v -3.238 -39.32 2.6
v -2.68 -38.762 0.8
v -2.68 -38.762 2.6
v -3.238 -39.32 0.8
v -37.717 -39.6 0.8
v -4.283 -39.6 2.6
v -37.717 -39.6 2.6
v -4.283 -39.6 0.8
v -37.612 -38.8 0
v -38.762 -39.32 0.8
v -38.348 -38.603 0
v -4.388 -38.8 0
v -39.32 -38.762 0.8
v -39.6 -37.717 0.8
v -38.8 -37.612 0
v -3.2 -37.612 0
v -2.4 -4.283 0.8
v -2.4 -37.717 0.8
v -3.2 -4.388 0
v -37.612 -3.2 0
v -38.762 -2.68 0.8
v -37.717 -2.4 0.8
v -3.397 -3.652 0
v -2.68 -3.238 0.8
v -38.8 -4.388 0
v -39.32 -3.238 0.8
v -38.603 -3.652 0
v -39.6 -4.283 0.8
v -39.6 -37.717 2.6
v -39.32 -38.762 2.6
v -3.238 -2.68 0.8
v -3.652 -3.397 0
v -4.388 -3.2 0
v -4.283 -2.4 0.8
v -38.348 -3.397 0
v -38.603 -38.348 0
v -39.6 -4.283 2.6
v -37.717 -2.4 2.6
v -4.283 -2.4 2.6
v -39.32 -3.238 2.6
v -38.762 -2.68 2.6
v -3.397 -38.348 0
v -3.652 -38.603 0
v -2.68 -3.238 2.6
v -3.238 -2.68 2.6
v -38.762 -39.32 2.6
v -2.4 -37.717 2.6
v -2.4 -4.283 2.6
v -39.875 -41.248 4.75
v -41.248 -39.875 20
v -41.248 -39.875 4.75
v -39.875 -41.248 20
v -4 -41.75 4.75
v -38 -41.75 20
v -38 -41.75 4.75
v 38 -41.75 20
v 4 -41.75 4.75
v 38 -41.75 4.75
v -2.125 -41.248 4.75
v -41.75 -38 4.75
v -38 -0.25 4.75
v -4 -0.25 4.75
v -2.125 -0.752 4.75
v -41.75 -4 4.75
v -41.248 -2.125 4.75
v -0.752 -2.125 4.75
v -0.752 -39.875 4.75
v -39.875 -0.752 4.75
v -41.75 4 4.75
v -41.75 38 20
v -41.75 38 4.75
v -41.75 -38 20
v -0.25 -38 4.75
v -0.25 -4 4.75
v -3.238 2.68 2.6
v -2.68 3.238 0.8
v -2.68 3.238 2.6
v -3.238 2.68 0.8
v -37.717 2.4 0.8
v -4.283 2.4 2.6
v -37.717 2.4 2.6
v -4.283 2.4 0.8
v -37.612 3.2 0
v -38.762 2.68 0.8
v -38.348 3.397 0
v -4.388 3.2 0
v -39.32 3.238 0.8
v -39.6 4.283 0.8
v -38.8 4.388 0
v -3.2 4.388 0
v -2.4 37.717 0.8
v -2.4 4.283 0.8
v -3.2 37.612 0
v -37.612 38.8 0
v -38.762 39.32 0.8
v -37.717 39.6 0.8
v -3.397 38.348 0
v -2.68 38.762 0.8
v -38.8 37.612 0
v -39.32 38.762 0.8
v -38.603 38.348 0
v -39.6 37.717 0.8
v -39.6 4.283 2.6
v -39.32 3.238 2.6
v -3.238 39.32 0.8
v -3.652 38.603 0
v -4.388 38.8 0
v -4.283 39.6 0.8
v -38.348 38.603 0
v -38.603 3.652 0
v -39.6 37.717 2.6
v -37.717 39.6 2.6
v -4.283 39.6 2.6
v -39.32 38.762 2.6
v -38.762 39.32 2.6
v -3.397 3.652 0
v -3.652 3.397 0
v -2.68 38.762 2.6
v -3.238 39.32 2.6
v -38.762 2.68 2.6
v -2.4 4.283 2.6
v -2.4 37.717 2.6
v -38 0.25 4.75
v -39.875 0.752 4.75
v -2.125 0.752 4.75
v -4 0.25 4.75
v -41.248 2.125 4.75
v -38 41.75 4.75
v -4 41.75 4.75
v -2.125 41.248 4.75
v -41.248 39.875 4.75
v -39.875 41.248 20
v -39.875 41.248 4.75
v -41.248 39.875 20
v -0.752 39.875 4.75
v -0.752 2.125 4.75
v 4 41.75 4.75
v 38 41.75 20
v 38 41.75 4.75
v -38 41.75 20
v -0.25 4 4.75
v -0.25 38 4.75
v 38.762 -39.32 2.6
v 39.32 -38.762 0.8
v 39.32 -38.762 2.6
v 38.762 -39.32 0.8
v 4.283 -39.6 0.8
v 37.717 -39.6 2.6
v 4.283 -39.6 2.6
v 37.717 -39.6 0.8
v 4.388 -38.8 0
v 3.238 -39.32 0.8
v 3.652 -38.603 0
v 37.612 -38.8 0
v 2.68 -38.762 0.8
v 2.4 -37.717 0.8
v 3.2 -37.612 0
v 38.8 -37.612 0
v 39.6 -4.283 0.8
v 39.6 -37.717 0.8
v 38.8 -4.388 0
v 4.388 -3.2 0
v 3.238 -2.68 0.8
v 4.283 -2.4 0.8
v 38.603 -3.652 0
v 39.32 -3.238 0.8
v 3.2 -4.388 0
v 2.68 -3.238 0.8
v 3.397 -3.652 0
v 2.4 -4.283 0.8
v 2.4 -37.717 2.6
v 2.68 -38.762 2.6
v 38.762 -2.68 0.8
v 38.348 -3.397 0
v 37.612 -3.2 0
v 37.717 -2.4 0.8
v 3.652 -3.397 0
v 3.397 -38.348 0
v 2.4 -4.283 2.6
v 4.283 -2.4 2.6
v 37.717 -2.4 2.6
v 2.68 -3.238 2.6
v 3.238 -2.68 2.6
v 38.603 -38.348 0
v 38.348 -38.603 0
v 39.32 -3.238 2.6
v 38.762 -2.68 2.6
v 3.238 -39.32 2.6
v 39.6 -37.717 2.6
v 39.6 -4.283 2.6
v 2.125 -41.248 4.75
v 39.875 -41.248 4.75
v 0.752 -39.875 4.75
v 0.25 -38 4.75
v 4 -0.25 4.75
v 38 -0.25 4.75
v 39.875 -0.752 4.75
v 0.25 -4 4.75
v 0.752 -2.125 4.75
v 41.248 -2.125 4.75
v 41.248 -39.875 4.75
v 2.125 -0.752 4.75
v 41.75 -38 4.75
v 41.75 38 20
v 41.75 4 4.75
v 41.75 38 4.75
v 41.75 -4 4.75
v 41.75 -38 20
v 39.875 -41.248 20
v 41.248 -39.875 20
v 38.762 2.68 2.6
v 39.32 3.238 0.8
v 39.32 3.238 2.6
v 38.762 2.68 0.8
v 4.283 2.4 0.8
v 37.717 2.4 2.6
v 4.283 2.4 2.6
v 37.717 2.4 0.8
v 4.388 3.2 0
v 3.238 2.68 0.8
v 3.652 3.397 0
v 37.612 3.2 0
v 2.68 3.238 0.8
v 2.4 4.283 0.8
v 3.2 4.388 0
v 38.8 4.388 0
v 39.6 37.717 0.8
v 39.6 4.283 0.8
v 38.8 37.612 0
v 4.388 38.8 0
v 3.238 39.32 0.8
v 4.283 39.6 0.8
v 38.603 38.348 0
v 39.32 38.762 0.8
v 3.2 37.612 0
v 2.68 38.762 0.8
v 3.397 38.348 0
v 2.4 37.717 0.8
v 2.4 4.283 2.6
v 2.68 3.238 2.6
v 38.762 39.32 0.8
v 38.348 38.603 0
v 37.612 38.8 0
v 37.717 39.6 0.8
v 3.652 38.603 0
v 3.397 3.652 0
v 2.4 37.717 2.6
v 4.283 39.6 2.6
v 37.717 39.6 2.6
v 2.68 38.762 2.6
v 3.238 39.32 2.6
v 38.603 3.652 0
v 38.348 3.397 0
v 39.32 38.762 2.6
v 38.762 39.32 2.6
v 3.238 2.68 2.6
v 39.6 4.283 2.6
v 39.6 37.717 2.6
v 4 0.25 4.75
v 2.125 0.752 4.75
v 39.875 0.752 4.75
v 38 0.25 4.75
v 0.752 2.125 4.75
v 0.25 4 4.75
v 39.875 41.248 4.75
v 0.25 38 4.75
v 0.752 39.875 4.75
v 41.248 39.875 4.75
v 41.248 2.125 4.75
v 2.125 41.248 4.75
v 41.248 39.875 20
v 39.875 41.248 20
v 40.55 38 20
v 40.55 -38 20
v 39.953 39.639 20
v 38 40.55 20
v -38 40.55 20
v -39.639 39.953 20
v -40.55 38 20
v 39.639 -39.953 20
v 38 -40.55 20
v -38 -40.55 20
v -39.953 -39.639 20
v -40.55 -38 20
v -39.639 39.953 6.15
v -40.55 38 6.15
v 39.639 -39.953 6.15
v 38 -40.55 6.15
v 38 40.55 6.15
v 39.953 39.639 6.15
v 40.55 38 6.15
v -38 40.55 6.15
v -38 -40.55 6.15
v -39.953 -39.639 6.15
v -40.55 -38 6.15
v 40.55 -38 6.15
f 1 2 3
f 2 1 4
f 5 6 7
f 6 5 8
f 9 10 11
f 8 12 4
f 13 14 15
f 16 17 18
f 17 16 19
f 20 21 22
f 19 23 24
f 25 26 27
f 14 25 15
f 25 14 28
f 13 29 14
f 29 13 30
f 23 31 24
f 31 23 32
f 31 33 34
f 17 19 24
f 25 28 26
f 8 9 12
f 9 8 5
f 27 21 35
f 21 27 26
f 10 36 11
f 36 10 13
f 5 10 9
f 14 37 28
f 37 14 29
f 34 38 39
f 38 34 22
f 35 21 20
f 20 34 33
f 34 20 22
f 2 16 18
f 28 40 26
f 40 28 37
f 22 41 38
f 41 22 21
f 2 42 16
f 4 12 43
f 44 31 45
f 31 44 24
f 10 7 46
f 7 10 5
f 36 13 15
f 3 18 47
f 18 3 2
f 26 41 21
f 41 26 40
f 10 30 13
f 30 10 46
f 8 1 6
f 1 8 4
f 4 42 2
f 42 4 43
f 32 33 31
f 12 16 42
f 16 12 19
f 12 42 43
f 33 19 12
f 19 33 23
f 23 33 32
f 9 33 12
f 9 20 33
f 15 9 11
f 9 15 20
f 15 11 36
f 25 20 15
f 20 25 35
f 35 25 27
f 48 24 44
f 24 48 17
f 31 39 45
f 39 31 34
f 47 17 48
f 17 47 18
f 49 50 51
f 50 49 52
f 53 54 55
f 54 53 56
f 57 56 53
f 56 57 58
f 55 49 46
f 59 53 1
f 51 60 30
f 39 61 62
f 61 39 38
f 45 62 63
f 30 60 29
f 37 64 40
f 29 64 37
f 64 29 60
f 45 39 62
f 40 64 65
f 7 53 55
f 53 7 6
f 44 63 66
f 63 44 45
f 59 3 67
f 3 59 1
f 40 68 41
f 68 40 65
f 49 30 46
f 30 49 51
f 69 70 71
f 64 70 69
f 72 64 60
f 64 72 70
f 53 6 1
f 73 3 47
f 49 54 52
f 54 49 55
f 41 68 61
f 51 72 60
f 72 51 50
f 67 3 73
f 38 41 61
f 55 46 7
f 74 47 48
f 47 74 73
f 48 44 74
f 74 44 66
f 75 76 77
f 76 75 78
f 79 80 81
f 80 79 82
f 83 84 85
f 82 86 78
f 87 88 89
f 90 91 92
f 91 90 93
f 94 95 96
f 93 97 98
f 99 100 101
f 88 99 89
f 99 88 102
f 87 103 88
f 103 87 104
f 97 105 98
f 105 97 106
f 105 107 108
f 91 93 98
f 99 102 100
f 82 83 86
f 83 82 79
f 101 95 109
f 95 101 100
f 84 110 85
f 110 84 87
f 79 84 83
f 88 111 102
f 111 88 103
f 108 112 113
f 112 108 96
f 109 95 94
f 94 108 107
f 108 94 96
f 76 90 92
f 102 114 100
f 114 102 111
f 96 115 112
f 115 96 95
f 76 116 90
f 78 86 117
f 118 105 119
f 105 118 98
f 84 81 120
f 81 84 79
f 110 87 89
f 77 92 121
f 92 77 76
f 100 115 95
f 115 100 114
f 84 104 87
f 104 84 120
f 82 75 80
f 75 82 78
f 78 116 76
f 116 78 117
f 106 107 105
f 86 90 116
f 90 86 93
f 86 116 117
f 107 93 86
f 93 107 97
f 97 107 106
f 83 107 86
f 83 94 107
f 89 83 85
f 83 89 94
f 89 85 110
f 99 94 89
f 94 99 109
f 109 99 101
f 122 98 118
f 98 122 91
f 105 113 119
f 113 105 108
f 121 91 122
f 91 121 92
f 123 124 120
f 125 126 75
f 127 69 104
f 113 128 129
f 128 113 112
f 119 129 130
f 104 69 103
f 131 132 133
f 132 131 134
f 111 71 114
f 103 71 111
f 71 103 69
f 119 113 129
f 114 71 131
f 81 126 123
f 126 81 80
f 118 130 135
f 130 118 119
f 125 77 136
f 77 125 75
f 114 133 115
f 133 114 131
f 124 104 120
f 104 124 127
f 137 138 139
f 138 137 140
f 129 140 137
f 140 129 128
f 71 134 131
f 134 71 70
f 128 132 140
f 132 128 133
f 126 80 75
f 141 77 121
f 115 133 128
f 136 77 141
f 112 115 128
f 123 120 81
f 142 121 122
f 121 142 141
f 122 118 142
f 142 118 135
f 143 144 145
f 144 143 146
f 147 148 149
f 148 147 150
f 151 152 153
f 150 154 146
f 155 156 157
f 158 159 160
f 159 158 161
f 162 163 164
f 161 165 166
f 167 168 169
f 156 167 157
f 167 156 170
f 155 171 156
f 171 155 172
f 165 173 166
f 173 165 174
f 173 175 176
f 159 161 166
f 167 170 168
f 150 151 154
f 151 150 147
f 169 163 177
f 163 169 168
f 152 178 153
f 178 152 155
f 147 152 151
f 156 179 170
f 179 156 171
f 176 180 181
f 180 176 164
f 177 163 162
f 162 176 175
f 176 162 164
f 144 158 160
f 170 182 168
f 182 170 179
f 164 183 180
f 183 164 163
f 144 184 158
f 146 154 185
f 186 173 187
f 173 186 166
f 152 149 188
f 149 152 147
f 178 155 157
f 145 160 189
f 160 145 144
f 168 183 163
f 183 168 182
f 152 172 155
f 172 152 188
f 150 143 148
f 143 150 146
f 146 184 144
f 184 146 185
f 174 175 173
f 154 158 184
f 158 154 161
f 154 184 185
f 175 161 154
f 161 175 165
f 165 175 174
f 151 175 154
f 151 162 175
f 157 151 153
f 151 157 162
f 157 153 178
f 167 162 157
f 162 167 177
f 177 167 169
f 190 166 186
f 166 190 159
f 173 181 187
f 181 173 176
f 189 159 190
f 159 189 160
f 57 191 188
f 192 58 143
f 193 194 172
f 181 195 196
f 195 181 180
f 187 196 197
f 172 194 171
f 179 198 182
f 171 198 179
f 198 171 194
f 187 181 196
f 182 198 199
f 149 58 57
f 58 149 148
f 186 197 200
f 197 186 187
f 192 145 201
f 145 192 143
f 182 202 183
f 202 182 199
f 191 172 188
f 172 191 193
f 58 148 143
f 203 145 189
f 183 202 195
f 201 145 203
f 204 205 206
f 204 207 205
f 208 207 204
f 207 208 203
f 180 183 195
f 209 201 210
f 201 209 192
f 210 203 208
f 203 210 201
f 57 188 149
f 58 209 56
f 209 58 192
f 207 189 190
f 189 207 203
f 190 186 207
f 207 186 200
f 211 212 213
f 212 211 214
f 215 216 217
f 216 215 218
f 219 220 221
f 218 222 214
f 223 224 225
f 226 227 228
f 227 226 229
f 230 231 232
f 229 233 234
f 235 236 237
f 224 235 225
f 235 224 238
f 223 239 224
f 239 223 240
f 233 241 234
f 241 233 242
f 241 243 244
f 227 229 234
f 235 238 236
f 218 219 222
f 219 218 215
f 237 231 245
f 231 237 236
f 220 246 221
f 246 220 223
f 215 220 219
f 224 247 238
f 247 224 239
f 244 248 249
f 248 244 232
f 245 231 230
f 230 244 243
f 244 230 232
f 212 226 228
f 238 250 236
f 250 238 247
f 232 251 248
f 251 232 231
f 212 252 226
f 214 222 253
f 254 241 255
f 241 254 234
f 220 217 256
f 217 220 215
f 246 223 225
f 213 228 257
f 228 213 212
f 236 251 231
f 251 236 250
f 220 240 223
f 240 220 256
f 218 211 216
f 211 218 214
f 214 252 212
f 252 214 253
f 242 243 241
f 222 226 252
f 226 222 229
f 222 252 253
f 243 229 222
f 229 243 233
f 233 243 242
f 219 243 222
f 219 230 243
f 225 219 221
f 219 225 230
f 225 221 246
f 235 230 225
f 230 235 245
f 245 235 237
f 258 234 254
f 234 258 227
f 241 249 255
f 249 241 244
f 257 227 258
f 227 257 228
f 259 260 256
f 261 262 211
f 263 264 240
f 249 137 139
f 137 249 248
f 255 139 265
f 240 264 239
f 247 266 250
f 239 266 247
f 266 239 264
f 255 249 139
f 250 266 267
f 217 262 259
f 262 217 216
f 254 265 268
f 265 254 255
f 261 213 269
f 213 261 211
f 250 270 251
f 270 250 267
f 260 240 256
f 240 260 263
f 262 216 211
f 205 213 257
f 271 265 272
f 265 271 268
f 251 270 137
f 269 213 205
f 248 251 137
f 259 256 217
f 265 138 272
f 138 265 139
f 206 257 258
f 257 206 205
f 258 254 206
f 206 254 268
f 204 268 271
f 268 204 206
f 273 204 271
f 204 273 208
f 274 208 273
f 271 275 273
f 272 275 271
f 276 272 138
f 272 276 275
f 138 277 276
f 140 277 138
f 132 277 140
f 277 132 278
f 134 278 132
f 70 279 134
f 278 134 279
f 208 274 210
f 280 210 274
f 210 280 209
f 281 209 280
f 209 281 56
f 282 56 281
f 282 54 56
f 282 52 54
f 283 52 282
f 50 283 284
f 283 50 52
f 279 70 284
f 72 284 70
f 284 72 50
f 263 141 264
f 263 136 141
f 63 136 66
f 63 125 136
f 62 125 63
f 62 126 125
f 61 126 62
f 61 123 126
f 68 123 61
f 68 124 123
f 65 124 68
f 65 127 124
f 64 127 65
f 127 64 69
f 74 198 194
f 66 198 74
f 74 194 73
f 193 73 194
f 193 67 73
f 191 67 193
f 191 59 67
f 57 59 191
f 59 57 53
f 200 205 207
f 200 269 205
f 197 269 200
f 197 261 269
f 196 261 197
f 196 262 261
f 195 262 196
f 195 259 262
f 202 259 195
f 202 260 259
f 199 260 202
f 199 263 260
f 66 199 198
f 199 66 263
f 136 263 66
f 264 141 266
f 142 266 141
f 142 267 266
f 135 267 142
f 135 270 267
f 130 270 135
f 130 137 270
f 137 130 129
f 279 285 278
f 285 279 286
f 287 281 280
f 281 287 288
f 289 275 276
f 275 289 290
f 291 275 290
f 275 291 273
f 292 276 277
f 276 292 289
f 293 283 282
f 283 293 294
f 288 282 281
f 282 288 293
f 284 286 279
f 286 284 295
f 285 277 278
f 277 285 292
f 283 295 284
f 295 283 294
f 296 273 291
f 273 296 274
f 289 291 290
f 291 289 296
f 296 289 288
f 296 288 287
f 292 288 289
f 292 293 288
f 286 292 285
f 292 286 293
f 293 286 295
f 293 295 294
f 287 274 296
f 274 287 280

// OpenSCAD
// file: ../lib/gridfinity.scad
// gridfinity.scad — shared Gridfinity baseplate + bin library (per spec).
//
// 42 mm pitch, 41.5 mm bins, baseplate socket 0.7/1.8/2.15 = 4.65 mm, 4 mm
// fillet; bin foot 0.8/1.8/2.15 = 4.75 mm, 3.75 mm corner radius. Verified the
// bin foot seats in the baseplate socket with ~0.25–0.5 mm clearance.
//
//   baseplate(nx, ny)                      — tiled receiving baseplate
//   bin_blank(nx, ny, h)                   — solid bin body (feet + block, no cavity)
//   bin(nx, ny, h, wall, floor)            — open Gridfinity bin
//   divided_bin(nx, ny, h, cols, rows, …)  — bin with internal compartments
//   lid(nx, ny, …)                         — friction lid for a bin of the same footprint
//   stack_base(nx, ny, h, …)               — baseplate-topped base; a bin socket-stacks on it

GF = 42; GF_FILLET = 4;
_C_TOP = 2.15; _C_MID = 1.8; _C_BOT = 0.7;
_BP_LIP = _C_TOP + _C_MID + _C_BOT; _BP_FLOOR = 1.2; BP_H = _BP_LIP + _BP_FLOOR;  // 5.85
BIN_SZ = 41.5; BIN_R = 3.75; BIN_BASE_H = 4.75;

// ---- baseplate ----
module _bp_cell(i = 0) { offset(r = -i) offset(r = GF_FILLET) offset(r = -GF_FILLET) square(GF, center = true); }
module _bp_socket() {
    e = 0.01;
    hull() { translate([0,0,BP_H-e]) linear_extrude(e) _bp_cell(0); translate([0,0,BP_H-_C_TOP]) linear_extrude(e) _bp_cell(_C_TOP); }
    translate([0,0,BP_H-_C_TOP-_C_MID]) linear_extrude(_C_MID) _bp_cell(_C_TOP);
    hull() { translate([0,0,BP_H-_C_TOP-_C_MID-e]) linear_extrude(e) _bp_cell(_C_TOP); translate([0,0,BP_H-_BP_LIP]) linear_extrude(e) _bp_cell(_C_TOP+_C_BOT); }
}
module baseplate(nx, ny) {
    w = nx*GF; d = ny*GF;
    difference() {
        translate([0,0,BP_H/2]) linear_extrude(BP_H, center=true) offset(GF_FILLET) offset(-GF_FILLET) square([w,d], center=true);
        for (ix=[0:nx-1], iy=[0:ny-1]) translate([(ix-(nx-1)/2)*GF, (iy-(ny-1)/2)*GF, 0]) _bp_socket();
    }
}

// ---- bin ----
module _bin_cell(i = 0) { offset(r = -i) offset(r = BIN_R) offset(r = -BIN_R) square(BIN_SZ, center = true); }
module _bin_foot() {
    e = 0.01;
    hull() { linear_extrude(e) _bin_cell(2.95); translate([0,0,0.8]) linear_extrude(e) _bin_cell(2.15); }    // bottom chamfer
    translate([0,0,0.8]) linear_extrude(1.8) _bin_cell(2.15);                                                 // vertical
    hull() { translate([0,0,2.6]) linear_extrude(e) _bin_cell(2.15); translate([0,0,BIN_BASE_H]) linear_extrude(e) _bin_cell(0); } // top chamfer
}
// Solid bin body: Gridfinity feet + the block above them, with no cavity cut.
// Cup-style bins (lib/vessel.scad) subtract their own bores from this instead of
// re-deriving the foot + shell union.
module bin_blank(nx, ny, h) {
    W = nx*GF - 0.5; D = ny*GF - 0.5;
    union() {
        for (ix=[0:nx-1], iy=[0:ny-1]) translate([(ix-(nx-1)/2)*GF, (iy-(ny-1)/2)*GF, 0]) _bin_foot();
        translate([0,0,BIN_BASE_H]) linear_extrude(h-BIN_BASE_H) offset(BIN_R) offset(-BIN_R) square([W,D], center=true);
    }
}

module _bin_shell(nx, ny, h, wall, floor) {
    W = nx*GF - 0.5; D = ny*GF - 0.5;
    difference() {
        bin_blank(nx, ny, h);
        translate([0,0,BIN_BASE_H+floor]) linear_extrude(h) offset(BIN_R-wall) offset(-(BIN_R-wall)) square([W-2*wall, D-2*wall], center=true);
    }
}
module bin(nx, ny, h, wall = 1.2, floor = 1.4) { _bin_shell(nx, ny, h, wall, floor); }

// ---- stacking base ----
// A bin whose TOP is a Gridfinity baseplate, so a standard bin socket-stacks on
// it (two-tier towers: instrument on top, cords/jig/adapters in the base). The
// base is open at the FRONT (−Y) by default so the lower item is reachable while
// the top tier stays socketed — same idea as drybox-splitter-stand's open cubby.
// The whole tower foots on the bench baseplate via this base's own foot.
//
//   h = interior height of the lower compartment (floor to the baseplate cap).
module stack_base(nx, ny, h, wall = 1.2, floor = 1.4, open_front = true) {
    W = nx*GF - 0.5; D = ny*GF - 0.5;
    z0 = BIN_BASE_H + floor;
    iw = W - 2*wall; id = D - 2*wall;
    difference() {
        union() {
            bin_blank(nx, ny, h);                    // solid foot + block to h
            translate([0,0,h]) baseplate(nx, ny);    // baseplate cap (sockets up)
        }
        // lower cavity, floor up to the cap underside
        translate([0,0,z0]) linear_extrude(h - z0 + 0.01)
            offset(BIN_R-wall) offset(-(BIN_R-wall)) square([iw, id], center=true);
        // open front: cut the −Y wall so you reach in under the cap
        if (open_front)
            translate([-iw/2, -D, z0]) cube([iw, D/2 + 0.01, h - z0 + 0.01]);
    }
}

module divided_bin(nx, ny, h, cols = 1, rows = 1, wall = 1.2, floor = 1.4, div = 1.2) {
    W = nx*GF - 0.5; D = ny*GF - 0.5;
    union() {
        bin(nx, ny, h, wall, floor);
        // internal divider walls (from the floor up to the rim)
        iw = W - 2*wall; id = D - 2*wall; z0 = BIN_BASE_H + floor;
        for (c = [1 : cols-1]) translate([-iw/2 + c*iw/cols - div/2, -id/2, z0]) cube([div, id, h - z0]);
        for (r = [1 : rows-1]) translate([-iw/2, -id/2 + r*id/rows - div/2, z0]) cube([iw, div, h - z0]);
    }
}

// ---- lid ----
// Friction lid for a bin of the same footprint: a flat plate with a skirt that
// drops into the bin's cavity. Emitted PRINT-READY — plate on the bed, skirt
// standing up — so it needs no supports. Flip it in your head to picture it
// fitted: the plate then caps the rim and the lid adds `t` to the stack height.
//
// Why lids exist here: full-extension drawer slides let small parts hop between
// compartments on a hard close, and brass inserts aren't magnetic — you can't
// sweep them back. `wall` must match the bin's wall so the skirt lands in the
// cavity; `clearance` is per-side slop between skirt and cavity.
module lid(nx, ny, t = 1.6, skirt = 4, wall = 1.2, clearance = 0.35, lid_wall = 1.6) {
    W = nx*GF - 0.5; D = ny*GF - 0.5;
    iw = W - 2*wall - 2*clearance; id = D - 2*wall - 2*clearance;   // skirt outer
    ir = BIN_R - wall;                                              // cavity corner radius
    union() {
        linear_extrude(t) offset(BIN_R) offset(-BIN_R) square([W, D], center=true);
        translate([0,0,t]) linear_extrude(skirt) difference() {
            offset(ir) offset(-ir) square([iw, id], center=true);
            offset(ir-lid_wall) offset(-(ir-lid_wall)) square([iw-2*lid_wall, id-2*lid_wall], center=true);
        }
    }
}
// file: instrument_towers_common.scad
// instrument_towers_common — two-tier socket-stacked towers: instrument in the
// TOP bin (grab-and-go), its bits (cords/adapters) in the open-front stack_base
// below. Lift the top off (or reach the front) to get at the base. Each tower is
// independent and foots on the bench baseplate via its own base.
include <../lib/gridfinity.scad>

// ---- DSLogic Plus tower (2×2) ----
DSLOGIC_W = 74.01;   // measured width — fits a 2×2 (81 interior)
DSLOGIC_D = 70;      // ⚠ estimate (glared read) — confirm
DSLOGIC_TOP_H = 20;  // ⚠ PLACEHOLDER — analyzer height sets the top-bin depth
CORD_BASE_H   = 42;  // ⚠ PLACEHOLDER — base depth for the flying-lead harness + clips
// main file
// dslogic_top — 2×2 bin the analyzer sits in; socket-stacks onto dslogic_base.
include <instrument_towers_common.scad>
bin(2, 2, DSLOGIC_TOP_H);
